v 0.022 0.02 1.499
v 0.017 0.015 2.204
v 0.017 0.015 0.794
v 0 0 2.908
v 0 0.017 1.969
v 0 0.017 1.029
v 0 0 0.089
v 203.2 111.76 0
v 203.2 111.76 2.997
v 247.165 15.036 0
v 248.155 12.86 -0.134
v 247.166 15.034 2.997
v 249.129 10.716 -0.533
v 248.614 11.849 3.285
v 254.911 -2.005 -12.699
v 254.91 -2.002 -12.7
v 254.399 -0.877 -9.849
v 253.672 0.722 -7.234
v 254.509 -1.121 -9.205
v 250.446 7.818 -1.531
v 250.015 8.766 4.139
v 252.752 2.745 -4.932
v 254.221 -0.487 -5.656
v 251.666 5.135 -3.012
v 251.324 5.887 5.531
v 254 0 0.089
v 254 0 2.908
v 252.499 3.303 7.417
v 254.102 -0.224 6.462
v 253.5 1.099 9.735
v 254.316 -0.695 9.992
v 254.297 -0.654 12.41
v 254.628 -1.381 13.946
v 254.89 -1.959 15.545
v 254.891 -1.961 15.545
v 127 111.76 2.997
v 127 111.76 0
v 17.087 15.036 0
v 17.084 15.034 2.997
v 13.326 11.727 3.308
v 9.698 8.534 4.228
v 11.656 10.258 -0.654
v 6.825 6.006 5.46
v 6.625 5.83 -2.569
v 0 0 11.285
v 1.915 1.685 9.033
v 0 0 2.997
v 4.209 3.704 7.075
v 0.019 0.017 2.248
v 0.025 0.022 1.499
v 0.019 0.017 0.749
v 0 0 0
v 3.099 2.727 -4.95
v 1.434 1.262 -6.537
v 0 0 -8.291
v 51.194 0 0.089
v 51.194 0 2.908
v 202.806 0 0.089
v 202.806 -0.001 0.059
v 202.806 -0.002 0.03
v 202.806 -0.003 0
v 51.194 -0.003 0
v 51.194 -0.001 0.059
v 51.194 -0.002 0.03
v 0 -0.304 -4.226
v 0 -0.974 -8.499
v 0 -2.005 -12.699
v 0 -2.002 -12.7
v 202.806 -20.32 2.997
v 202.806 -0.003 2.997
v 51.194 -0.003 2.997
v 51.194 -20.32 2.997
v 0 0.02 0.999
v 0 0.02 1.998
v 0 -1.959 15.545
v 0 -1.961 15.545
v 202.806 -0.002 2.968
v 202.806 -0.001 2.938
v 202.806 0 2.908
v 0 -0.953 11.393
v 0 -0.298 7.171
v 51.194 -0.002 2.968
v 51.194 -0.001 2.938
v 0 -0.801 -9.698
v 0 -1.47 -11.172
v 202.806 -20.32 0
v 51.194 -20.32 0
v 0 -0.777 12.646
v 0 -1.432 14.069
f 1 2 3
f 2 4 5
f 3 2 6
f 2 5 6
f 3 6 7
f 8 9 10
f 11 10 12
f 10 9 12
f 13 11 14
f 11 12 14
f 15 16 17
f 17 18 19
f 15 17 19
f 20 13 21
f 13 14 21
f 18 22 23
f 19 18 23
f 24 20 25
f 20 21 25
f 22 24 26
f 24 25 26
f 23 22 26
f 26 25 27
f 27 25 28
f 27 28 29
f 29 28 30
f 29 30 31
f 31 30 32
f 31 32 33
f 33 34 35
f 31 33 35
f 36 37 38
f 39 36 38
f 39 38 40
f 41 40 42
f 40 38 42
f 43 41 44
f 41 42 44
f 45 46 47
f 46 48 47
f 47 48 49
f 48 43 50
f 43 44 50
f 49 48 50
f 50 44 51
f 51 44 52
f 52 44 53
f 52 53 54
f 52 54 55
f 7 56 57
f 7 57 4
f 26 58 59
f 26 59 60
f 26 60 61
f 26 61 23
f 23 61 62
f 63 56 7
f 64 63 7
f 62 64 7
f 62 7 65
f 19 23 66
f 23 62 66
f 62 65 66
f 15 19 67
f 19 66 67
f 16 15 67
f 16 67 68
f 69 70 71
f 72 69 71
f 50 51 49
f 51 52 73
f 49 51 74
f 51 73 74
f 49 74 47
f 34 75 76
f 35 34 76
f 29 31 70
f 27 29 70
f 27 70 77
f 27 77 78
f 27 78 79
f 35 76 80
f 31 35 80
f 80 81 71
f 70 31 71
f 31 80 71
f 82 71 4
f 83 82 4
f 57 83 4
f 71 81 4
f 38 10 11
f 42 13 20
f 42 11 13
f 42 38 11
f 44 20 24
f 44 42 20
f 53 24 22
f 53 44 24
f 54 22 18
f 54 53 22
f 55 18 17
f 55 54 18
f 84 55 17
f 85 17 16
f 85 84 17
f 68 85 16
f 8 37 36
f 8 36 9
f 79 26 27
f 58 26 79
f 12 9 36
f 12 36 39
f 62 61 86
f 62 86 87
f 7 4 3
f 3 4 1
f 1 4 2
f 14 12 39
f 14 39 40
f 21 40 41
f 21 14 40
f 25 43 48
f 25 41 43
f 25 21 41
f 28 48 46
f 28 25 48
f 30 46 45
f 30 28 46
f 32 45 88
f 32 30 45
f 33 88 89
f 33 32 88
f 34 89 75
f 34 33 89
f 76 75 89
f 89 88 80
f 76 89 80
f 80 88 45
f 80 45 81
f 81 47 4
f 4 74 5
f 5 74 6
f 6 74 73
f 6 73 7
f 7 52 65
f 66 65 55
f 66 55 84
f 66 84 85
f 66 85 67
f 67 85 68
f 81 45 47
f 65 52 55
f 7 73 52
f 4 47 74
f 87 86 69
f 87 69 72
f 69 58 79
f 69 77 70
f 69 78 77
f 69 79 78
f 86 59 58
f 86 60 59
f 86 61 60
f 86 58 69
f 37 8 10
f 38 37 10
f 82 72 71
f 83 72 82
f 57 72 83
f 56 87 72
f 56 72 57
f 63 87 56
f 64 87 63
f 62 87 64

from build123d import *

# Parameters (mm, degrees)
BOSS_EXTRUDE1_DEPTH = 2.9972
EXTRUDE_THIN1_REACH = 279.516
FILLET1_R           = 17.78


with BuildPart() as part:
    # Sketch1 → Boss-Extrude1 (new body)
    with BuildSketch(Plane.XY):
        Polygon((0, 0), (127, 111.76), (203.2, 111.76), (254, 0), (202.8063, 0), (202.8063, -20.32), (51.1937, -20.32), (51.1937, 0), align=None)
    extrude(amount=BOSS_EXTRUDE1_DEPTH)

    # Extrude-Thin1: up to this plane
    extrude_thin1_end = Plane(origin=(203.2, 111.76, 2.9972), z_dir=(-0.9103664774625979, -0.41380294430119924, 0))
    # Sketch2 → Extrude-Thin1 (add, up to the surface)
    with BuildSketch(Plane(origin=(0, 0, 0), x_dir=(0, 0, -1), z_dir=(1, 0, 0)), mode=Mode.PRIVATE) as extrude_thin1_sk1:
        with BuildLine():
            ThreePointArc((12.7, -2.002489682), (-1.419520366, 0.02204761), (-15.545275431, -1.958520612))
            Line((-15.545275431, -1.958520612), (-15.544573097, -1.96096158))
            ThreePointArc((-15.544573097, -1.96096158), (-1.41952432, 0.019507613), (12.69929007, -2.004928452))
            Line((12.69929007, -2.004928452), (12.7, -2.002489682))
        make_face()
    extrude_thin1_tool1 = split(extrude(extrude_thin1_sk1.sketch, amount=EXTRUDE_THIN1_REACH, mode=Mode.PRIVATE), bisect_by=extrude_thin1_end, keep=Keep.BOTH, mode=Mode.PRIVATE)
    add(extrude_thin1_tool1.solids().sort_by_distance((0, -1.92456, -12.427752))[0])

    # Fillet1
    # the kernel refuses this fillet: 17.78 mm, written as the material it adds along each edge
    with BuildSketch(Plane(origin=(0, 0, 0), x_dir=(0, 1, 0), z_dir=(1, 0, 0))) as fillet1_piece_1_section:
        with BuildLine():
            CenterArc((15.036348307, -17.78), FILLET1_R, 90, 73.398450401)
            ThreePointArc((-2.002489682, -12.7), (-0.597845135, -6.413606594), (0, 0))
            Line((0, 0), (15.036348307, 0))
        make_face()
    fillet1_piece_1 = extrude(amount=291.590870767, mode=Mode.PRIVATE)
    fillet1_piece_1 = split(fillet1_piece_1, bisect_by=Plane(origin=(74.006923082, 65.126092312, -3.495773927), z_dir=(0.6606278948920264, -0.750713516922754, 0)), keep=Keep.TOP, mode=Mode.PRIVATE)
    fillet1_piece_1 = split(fillet1_piece_1, bisect_by=Plane(origin=(230.677770328, 51.308905278, -3.495773927), z_dir=(-0.9103664774625979, -0.41380294430119924, 0)), keep=Keep.TOP, mode=Mode.PRIVATE)
    add(fillet1_piece_1)
    with BuildSketch(Plane(origin=(291.585706816, 0, 2.9972), x_dir=(0, -0.15421422141514082, 0.9880374354817341), z_dir=(-1, 0, 0))) as fillet1_piece_2_section:
        with BuildLine():
            CenterArc((15.248805398, 17.596363006), FILLET1_R, 188.871226526, 72.886892423)
            Line((-2.318500205, 14.854434149), (0, 0))
            ThreePointArc((0, 0), (6.35, 0.398437524), (12.7, 0))
        make_face()
    fillet1_piece_2 = extrude(amount=291.585706816, mode=Mode.PRIVATE)
    fillet1_piece_2 = split(fillet1_piece_2, bisect_by=Plane(origin=(74.031944404, 65.148111076, 6.44558698), z_dir=(0.6606278948920264, -0.750713516922754, 0)), keep=Keep.TOP, mode=Mode.PRIVATE)
    fillet1_piece_2 = split(fillet1_piece_2, bisect_by=Plane(origin=(230.652775468, 51.36389397, 6.44558698), z_dir=(-0.9103664774625979, -0.41380294430119924, 0)), keep=Keep.TOP, mode=Mode.PRIVATE)
    add(fillet1_piece_2)


solid = part.part
